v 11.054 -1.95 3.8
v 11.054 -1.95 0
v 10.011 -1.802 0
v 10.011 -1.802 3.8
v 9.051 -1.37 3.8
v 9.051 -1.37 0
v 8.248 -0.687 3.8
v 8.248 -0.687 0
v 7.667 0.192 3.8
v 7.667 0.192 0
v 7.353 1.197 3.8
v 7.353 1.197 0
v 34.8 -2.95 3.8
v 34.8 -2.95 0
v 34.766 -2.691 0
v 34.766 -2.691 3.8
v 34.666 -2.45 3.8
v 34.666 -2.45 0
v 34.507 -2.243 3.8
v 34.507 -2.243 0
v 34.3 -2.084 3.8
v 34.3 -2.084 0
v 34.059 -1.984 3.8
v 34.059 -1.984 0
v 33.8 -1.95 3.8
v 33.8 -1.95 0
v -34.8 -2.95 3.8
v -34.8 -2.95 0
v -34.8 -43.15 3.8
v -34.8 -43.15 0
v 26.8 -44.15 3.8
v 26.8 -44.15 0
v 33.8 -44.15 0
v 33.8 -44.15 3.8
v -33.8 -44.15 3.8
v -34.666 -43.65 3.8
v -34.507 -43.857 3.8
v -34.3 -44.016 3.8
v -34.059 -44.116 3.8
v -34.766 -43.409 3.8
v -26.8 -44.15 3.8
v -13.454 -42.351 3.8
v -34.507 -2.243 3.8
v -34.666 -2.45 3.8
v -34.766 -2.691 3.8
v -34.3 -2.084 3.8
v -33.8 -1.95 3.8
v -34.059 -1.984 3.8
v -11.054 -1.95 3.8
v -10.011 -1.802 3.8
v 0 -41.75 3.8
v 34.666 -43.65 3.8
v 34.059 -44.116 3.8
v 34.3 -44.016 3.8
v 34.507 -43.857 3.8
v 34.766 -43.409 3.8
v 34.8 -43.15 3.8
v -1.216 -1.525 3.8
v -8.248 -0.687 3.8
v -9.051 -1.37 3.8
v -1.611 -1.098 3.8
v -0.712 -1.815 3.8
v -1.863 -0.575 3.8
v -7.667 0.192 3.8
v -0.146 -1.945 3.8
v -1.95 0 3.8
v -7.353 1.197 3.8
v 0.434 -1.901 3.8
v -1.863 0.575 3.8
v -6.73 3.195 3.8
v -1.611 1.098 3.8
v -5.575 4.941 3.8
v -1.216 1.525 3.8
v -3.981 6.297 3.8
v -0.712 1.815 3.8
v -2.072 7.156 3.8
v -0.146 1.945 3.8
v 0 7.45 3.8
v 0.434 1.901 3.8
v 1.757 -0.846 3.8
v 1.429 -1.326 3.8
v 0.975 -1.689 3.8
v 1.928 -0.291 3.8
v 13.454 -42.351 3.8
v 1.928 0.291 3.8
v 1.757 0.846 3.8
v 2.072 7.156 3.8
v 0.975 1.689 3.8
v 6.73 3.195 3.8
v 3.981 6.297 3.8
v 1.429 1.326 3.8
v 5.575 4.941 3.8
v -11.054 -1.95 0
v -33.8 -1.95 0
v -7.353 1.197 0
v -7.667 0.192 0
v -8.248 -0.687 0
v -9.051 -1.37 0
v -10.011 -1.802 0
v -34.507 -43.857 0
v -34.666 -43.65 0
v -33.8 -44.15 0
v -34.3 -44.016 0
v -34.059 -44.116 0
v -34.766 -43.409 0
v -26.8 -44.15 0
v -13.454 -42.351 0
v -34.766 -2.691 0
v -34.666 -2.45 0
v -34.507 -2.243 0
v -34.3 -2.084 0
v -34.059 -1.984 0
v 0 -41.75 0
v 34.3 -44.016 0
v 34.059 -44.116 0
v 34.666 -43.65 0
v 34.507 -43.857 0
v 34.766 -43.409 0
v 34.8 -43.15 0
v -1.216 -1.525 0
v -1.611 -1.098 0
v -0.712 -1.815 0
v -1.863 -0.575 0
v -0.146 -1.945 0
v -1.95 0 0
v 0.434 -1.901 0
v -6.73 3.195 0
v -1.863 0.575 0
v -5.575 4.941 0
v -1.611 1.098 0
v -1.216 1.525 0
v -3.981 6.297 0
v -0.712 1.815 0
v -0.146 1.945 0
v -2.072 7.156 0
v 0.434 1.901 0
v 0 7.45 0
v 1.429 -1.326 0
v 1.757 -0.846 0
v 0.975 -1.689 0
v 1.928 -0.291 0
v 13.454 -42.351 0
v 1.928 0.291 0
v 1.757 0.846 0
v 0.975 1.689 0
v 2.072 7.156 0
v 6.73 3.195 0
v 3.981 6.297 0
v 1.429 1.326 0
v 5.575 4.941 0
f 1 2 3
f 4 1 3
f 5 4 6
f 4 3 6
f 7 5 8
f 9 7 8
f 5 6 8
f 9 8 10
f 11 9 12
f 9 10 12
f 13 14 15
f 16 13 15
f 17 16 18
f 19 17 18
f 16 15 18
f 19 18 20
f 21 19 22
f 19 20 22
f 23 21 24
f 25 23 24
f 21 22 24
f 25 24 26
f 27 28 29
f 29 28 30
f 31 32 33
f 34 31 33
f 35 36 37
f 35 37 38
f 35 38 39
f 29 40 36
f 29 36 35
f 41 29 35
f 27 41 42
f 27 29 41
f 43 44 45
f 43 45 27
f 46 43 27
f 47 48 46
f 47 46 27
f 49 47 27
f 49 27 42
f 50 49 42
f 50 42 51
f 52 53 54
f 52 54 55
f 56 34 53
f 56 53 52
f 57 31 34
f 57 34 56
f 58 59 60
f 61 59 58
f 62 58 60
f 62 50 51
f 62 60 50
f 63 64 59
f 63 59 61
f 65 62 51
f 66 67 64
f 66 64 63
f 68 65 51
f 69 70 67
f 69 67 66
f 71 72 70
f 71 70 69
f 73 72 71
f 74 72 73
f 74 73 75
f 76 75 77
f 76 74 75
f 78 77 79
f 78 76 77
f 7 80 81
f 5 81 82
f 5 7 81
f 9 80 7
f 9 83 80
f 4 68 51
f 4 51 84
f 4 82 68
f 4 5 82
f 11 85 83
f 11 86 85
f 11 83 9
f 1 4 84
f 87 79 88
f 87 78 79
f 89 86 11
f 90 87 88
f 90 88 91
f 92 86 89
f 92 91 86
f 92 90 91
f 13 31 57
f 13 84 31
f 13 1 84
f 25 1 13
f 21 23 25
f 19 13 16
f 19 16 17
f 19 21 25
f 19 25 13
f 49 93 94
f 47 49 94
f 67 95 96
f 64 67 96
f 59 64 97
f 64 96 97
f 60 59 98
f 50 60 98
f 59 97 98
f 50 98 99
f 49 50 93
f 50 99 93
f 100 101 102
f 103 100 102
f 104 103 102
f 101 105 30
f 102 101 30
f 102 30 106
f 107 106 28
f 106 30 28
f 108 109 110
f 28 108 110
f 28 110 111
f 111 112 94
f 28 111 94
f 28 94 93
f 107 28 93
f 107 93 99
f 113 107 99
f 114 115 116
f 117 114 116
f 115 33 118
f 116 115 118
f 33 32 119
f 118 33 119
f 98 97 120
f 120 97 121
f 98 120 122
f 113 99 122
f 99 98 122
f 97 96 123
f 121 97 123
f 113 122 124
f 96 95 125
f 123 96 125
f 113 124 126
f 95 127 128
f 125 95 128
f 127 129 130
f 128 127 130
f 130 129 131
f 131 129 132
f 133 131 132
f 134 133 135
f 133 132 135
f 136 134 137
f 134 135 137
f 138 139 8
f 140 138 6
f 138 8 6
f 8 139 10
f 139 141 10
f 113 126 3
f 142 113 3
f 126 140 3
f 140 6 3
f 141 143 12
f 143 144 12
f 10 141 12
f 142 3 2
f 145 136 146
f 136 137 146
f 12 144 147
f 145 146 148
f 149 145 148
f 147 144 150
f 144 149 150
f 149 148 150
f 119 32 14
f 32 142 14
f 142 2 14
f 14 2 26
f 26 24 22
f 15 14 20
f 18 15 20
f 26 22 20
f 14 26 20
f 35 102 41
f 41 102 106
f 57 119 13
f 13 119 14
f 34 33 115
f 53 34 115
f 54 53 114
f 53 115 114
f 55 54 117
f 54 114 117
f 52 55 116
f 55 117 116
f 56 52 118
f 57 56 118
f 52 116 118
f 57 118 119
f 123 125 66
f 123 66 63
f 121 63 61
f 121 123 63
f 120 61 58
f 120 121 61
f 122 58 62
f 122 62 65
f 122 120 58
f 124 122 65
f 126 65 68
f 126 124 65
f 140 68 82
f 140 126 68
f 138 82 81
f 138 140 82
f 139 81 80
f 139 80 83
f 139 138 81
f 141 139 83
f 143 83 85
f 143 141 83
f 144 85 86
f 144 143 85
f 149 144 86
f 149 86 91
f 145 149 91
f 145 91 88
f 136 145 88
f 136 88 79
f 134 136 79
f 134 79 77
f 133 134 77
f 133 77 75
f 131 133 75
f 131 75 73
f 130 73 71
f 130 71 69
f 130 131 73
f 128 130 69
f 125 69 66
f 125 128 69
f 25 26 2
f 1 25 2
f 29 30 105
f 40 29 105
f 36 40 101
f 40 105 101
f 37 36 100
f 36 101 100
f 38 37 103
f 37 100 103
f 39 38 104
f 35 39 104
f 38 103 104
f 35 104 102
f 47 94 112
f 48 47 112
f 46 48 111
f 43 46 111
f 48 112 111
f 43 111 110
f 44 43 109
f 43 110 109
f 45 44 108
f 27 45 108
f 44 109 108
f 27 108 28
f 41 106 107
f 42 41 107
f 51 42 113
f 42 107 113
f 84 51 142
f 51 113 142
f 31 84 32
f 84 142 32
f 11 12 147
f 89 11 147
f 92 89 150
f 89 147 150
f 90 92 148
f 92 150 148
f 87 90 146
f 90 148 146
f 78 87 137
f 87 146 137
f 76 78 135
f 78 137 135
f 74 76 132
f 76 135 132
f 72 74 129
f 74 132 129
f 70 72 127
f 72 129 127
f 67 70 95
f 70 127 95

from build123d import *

# Parameters (mm, degrees)
SKETCH1_R      = 1.95
EXTRUDE1_DEPTH = 3.8


with BuildPart() as part:
    # Sketch1 → Extrude1 (new body)
    with BuildSketch(Plane.XY):
        with BuildLine():
            Line((26.8, -44.15), (33.8, -44.15))
            ThreePointArc((33.8, -44.15), (34.507106781, -43.857106781), (34.8, -43.15))
            Line((34.8, -43.15), (34.8, -2.95))
            ThreePointArc((34.8, -2.95), (34.507106781, -2.242893219), (33.8, -1.95))
            Line((33.8, -1.95), (11.054410884, -1.95))
            ThreePointArc((11.054410884, -1.95), (8.625166624, -1.056794064), (7.35315724, 1.197321429))
            ThreePointArc((7.35315724, 1.197321429), (0, 7.45), (-7.35315724, 1.197321429))
            ThreePointArc((-7.35315724, 1.197321429), (-8.625166624, -1.056794064), (-11.054410884, -1.95))
            Line((-11.054410884, -1.95), (-33.8, -1.95))
            ThreePointArc((-33.8, -1.95), (-34.507106781, -2.242893219), (-34.8, -2.95))
            Line((-34.8, -2.95), (-34.8, -43.15))
            ThreePointArc((-34.8, -43.15), (-34.507106781, -43.857106781), (-33.8, -44.15))
            Line((-33.8, -44.15), (-26.8, -44.15))
            ThreePointArc((-26.8, -44.15), (0, -41.75), (26.8, -44.15))
        make_face()
        with Locations(Location((0, 0, 0), (0, 0, 180))):
            Circle(SKETCH1_R, mode=Mode.SUBTRACT)
    extrude(amount=EXTRUDE1_DEPTH)


solid = part.part
